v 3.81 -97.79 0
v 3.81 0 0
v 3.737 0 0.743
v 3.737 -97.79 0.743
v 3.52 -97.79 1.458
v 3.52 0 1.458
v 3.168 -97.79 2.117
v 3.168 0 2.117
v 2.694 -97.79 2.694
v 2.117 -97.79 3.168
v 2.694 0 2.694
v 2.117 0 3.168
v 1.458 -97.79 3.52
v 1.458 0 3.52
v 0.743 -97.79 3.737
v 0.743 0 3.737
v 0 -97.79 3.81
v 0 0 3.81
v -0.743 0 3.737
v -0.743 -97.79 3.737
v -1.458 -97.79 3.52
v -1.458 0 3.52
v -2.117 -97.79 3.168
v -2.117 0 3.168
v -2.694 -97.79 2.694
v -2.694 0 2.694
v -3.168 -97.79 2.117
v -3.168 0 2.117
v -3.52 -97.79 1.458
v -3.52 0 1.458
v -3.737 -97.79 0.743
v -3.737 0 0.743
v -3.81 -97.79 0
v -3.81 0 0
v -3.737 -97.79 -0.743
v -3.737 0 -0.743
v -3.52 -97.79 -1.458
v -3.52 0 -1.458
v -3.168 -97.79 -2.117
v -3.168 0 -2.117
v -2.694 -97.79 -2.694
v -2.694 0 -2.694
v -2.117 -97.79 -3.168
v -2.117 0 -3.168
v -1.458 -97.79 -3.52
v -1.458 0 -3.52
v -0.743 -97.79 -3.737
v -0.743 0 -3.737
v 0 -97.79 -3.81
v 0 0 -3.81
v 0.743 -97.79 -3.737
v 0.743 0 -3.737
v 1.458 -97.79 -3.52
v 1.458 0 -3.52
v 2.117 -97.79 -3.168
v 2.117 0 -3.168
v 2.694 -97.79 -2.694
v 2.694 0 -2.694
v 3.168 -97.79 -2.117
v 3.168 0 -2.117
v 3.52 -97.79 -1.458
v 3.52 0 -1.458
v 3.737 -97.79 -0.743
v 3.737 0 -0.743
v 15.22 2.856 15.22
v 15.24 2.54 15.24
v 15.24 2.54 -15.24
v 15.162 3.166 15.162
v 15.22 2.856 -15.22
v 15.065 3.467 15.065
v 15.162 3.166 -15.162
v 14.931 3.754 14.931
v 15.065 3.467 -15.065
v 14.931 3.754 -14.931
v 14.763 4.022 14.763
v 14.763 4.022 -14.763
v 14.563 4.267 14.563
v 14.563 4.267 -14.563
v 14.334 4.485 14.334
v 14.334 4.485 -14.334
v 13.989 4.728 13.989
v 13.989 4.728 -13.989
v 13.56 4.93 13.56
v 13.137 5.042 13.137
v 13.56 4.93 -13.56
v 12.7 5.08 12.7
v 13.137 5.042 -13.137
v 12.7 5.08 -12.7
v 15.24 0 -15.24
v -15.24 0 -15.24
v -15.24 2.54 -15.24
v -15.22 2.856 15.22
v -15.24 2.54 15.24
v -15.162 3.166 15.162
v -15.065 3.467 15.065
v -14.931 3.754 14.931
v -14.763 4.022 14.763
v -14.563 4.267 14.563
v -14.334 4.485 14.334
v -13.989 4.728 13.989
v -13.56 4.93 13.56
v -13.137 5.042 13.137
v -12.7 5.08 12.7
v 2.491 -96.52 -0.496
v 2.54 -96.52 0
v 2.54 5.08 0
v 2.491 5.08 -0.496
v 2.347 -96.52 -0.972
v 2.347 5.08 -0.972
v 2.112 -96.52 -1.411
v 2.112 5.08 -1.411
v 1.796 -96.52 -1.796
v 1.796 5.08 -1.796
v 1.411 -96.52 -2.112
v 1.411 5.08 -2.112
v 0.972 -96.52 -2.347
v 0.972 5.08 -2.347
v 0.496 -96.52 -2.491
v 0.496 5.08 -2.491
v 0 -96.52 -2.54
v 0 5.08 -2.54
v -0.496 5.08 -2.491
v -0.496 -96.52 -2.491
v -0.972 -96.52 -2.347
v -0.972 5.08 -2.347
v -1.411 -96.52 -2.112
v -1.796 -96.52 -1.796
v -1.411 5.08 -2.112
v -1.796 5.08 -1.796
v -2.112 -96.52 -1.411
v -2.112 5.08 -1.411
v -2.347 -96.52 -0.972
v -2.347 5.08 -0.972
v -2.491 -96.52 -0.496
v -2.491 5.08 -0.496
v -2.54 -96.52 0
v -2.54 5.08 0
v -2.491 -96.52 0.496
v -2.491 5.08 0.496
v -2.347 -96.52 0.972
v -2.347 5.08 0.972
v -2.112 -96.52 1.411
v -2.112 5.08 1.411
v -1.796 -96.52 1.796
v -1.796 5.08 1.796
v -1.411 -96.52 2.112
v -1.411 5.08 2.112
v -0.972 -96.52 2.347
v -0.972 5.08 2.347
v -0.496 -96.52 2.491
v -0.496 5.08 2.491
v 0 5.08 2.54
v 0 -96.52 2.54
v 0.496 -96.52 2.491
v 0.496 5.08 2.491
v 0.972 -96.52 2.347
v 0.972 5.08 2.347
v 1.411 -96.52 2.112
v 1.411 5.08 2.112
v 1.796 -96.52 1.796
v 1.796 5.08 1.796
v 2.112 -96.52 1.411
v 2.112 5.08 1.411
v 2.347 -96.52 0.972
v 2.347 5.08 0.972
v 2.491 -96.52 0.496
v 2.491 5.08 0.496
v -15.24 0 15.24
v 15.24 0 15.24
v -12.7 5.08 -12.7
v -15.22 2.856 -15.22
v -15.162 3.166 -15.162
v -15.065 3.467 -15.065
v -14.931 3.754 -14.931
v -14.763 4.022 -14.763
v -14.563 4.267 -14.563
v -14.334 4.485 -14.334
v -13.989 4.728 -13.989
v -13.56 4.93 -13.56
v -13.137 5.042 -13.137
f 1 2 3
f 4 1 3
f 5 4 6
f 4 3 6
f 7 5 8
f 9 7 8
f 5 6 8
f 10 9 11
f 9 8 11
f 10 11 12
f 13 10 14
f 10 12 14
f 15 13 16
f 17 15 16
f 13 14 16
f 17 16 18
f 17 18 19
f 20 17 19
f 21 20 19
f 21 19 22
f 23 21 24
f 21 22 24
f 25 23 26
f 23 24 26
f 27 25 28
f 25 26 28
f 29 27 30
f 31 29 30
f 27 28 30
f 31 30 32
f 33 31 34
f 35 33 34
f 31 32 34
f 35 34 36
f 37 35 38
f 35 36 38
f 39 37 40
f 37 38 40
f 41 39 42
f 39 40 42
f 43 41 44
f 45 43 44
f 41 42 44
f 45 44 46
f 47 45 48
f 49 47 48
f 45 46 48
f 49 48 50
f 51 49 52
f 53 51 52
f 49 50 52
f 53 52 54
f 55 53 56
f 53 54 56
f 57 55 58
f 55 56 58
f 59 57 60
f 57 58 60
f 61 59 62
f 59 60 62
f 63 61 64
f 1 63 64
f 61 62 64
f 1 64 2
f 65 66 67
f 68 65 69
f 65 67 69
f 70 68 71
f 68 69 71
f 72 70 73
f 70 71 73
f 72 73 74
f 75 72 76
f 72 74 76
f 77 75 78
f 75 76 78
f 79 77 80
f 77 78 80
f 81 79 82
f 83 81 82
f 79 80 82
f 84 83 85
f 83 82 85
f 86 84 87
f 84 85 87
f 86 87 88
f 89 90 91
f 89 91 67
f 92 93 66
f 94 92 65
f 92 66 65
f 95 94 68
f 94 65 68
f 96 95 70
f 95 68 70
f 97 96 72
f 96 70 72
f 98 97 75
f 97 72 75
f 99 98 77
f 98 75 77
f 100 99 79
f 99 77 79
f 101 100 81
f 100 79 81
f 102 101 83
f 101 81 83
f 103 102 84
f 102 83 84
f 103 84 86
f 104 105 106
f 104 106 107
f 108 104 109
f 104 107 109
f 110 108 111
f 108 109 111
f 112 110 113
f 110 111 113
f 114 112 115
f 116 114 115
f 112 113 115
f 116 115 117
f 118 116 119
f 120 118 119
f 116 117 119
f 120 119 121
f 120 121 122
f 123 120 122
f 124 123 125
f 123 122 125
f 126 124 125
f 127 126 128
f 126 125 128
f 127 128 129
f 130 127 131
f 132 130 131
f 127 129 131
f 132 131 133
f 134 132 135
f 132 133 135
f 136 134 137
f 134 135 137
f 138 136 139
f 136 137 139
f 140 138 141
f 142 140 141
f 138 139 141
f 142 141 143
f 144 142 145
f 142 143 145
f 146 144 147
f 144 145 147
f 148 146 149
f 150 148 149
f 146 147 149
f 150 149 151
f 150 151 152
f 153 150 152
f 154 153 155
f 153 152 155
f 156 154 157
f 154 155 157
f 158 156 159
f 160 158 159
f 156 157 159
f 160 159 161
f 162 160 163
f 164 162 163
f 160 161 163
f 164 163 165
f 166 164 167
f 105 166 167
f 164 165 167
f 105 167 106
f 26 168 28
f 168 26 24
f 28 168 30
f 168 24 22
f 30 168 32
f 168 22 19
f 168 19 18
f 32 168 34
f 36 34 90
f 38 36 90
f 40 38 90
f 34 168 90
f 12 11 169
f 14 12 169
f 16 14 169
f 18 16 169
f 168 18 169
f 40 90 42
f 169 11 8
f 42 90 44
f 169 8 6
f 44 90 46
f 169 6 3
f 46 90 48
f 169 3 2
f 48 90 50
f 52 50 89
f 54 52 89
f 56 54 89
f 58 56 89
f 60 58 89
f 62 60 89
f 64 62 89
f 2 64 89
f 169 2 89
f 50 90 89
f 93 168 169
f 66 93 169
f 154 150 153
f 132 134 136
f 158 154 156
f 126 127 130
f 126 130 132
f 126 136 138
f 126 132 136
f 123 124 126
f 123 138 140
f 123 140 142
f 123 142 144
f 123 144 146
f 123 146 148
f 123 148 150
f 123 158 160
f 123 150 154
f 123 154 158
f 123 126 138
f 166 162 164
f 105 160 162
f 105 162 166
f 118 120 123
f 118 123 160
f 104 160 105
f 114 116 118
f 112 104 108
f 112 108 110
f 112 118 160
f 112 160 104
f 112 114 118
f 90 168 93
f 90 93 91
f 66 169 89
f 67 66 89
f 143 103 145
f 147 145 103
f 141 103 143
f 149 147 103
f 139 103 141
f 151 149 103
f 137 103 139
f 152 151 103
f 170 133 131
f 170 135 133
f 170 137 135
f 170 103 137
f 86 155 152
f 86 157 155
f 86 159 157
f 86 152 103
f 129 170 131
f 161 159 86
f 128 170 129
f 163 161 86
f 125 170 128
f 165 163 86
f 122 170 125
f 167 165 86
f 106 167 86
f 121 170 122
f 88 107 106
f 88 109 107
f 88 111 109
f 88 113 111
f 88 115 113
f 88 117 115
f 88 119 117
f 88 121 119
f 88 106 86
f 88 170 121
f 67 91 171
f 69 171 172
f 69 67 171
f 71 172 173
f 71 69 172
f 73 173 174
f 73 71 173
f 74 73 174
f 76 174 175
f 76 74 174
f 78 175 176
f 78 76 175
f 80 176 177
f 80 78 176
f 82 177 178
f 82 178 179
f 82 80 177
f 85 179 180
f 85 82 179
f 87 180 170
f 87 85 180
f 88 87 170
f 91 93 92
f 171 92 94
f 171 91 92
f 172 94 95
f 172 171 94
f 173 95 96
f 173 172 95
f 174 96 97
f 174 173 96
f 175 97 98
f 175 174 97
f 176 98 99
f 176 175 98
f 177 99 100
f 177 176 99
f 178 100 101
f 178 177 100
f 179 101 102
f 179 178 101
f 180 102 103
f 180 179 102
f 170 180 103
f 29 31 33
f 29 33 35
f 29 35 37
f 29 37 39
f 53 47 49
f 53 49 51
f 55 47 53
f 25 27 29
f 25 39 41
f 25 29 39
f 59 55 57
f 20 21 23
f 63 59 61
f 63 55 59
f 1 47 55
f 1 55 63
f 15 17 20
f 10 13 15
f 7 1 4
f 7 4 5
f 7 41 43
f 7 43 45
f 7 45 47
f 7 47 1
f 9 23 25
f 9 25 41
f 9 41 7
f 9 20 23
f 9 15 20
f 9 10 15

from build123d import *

# Parameters (mm, degrees)
SKETCH1_W           = 30.48
SKETCH1_H           = 30.48
BOSS_EXTRUDE1_DEPTH = 5.08
FILLET1_R           = 2.54
SKETCH2_R           = 3.81
BOSS_EXTRUDE2_DEPTH = 97.79
SKETCH3_R           = 2.54
CUT_EXTRUDE1_DEPTH  = 101.6


with BuildPart() as part:
    # Sketch1 → Boss-Extrude1 (new body)
    with BuildSketch(Plane(origin=(0, 0, 0), x_dir=(1, 0, 0), z_dir=(0, 1, 0))):
        Rectangle(SKETCH1_W, SKETCH1_H)
    extrude(amount=BOSS_EXTRUDE1_DEPTH)

    # Fillet1
    fillet1_edges = [part.edges().sort_by_distance(p)[0] for p in [
        (-15.24, 5.08, 0),
        (0, 5.08, 15.24),
        (15.24, 5.08, 0),
        (0, 5.08, -15.24),
    ]]
    fillet(fillet1_edges, radius=FILLET1_R)

    # Sketch2 → Boss-Extrude2 (add)
    with BuildSketch(Plane.XZ):
        Circle(SKETCH2_R)
    extrude(amount=BOSS_EXTRUDE2_DEPTH)

    # Sketch3 → Cut-Extrude1 (cut)
    with BuildSketch(Plane(origin=(0, 5.08, 0), x_dir=(1, 0, 0), z_dir=(0, 1, 0))):
        Circle(SKETCH3_R)
    extrude(amount=-CUT_EXTRUDE1_DEPTH, mode=Mode.SUBTRACT)


solid = part.part
